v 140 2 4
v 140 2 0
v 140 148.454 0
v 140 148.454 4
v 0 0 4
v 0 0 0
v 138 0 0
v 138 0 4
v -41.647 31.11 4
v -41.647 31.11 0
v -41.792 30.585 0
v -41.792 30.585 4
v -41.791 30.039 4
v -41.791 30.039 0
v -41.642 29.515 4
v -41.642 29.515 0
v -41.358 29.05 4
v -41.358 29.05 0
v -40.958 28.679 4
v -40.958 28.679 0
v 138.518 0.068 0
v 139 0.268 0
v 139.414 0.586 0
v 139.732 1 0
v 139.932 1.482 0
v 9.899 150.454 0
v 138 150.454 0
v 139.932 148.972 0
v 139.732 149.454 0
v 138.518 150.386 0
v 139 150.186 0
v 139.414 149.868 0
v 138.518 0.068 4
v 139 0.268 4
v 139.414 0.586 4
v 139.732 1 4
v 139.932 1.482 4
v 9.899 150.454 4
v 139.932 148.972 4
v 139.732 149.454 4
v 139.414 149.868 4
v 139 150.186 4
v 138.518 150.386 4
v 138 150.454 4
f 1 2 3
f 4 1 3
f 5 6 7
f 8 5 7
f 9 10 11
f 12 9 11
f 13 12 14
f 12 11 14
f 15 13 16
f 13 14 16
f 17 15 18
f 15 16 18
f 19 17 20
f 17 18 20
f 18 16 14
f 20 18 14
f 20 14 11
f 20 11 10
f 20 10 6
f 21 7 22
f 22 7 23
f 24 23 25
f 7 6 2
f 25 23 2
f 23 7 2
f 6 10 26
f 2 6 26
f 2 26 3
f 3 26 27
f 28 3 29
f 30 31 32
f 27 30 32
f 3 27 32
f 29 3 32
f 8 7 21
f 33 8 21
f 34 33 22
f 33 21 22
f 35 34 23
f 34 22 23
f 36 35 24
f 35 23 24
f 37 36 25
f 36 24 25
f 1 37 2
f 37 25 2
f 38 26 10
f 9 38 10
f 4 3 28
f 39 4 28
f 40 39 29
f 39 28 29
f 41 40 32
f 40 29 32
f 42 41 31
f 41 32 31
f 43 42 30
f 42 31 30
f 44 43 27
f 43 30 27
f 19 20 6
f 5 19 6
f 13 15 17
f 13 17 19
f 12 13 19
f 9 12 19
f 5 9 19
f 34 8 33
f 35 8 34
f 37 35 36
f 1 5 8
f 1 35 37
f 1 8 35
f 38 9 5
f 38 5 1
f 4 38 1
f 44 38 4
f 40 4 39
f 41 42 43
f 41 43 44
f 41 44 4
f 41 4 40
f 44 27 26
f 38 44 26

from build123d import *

# Parameters (mm, degrees)
RESSALTO_EXTRUS_O1_DEPTH = 4


with BuildPart() as part:
    # Esboço1 → Ressalto-extrusão1 (new body)
    with BuildSketch(Plane.XY):
        with BuildLine():
            Line((0, 0), (138, 0))
            ThreePointArc((138, 0), (139.414213562, 0.585786438), (140, 2))
            Line((140, 2), (140, 148.454256327))
            ThreePointArc((140, 148.454256327), (139.414213562, 149.86846989), (138, 150.454256327))
            Line((138, 150.454256327), (9.899407771, 150.454256327))
            Line((9.899407771, 150.454256327), (-41.646512669, 31.110140067))
            ThreePointArc((-41.646512669, 31.110140067), (-41.734695124, 29.77189369), (-40.957602214, 28.678821818))
            Line((-40.957602214, 28.678821818), (0, 0))
        make_face()
    extrude(amount=RESSALTO_EXTRUS_O1_DEPTH)


solid = part.part
